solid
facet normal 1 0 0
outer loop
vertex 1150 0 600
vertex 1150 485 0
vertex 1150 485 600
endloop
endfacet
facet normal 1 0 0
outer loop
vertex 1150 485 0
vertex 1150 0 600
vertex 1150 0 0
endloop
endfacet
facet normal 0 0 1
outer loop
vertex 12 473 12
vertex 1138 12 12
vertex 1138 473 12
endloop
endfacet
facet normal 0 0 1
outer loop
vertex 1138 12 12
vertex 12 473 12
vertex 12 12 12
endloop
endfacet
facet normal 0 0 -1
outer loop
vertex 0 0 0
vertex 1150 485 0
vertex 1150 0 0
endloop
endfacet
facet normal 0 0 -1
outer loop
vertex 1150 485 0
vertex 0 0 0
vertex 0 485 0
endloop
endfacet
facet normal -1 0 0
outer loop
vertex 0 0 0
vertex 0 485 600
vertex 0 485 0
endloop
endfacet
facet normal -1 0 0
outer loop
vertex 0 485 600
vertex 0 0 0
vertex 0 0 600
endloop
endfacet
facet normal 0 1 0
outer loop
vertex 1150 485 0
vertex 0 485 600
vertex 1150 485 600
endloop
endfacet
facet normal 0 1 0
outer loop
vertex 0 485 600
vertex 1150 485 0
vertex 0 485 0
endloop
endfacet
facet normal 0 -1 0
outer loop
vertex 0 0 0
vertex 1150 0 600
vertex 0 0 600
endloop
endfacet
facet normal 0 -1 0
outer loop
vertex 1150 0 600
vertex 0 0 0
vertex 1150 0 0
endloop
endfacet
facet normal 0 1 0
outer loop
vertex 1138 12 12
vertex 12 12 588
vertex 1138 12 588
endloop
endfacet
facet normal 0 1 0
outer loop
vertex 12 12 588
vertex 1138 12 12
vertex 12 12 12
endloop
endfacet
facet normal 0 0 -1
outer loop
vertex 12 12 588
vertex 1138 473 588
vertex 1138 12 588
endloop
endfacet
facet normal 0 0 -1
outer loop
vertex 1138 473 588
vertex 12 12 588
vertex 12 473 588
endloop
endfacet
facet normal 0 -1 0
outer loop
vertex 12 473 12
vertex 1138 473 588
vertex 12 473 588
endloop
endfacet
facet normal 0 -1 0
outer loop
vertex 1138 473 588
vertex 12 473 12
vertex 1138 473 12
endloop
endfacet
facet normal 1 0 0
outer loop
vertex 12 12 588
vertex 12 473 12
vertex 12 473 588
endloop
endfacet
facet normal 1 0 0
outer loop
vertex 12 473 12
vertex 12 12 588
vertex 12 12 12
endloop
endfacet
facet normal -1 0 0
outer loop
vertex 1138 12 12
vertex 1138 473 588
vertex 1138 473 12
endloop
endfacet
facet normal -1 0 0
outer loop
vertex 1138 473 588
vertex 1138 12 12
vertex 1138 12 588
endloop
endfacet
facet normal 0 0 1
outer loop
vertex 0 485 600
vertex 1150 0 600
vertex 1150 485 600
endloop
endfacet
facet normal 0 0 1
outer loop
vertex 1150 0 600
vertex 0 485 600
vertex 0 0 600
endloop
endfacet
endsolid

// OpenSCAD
$fn=24;

// all dimensions are outside dimensions
// basic box assumes that top side is open
module basic_box(width, height, depth, thickness=12){
    // bottom plate
    plate(width, depth, thickness);  
    
    // front plate
    translate([0,thickness,thickness]) rotate([90,0,0]) plate(width, height-thickness, thickness);  
    // back plate
    translate([0,depth ,thickness]) rotate([90,0,0]) plate(width, height-thickness, thickness);  
    
    // side plate left
    translate([0,thickness,height]) rotate([0,90,0]) plate(height-thickness, depth-2*thickness, thickness);  
    // side plate right
    translate([width-thickness,thickness,height]) rotate([0,90,0]) plate(height-thickness, depth-2*thickness, thickness);  
   

}

module plate(x,y,z){
    color("LightGrey") cube([x,y,z]);
    echo("Plate: ",x/10,"x",y/10,"cm");

}


// not very elegant, but works
module printed_edge_3sides(size=50, thickness=6){
   difference(){
       cube(size);
       translate([thickness, thickness, thickness]) {
         difference(){
            cube(size);
            rotate(a=45,v=[0,0,1]) translate([-size+10,-size/2,0])   cube(size);
         }
       }
       translate(v=[size/3*2,thickness+0.5,size/3]) rotate([90,0,0]) cylinder(r=3.5/2, h=thickness+1);
       translate(v=[size/3*2,thickness+0.5,size/3*2]) rotate([90,0,0]) cylinder(r=3.5/2, h=thickness+1);
       translate(v=[-0.5,size/3*2,size/3]) rotate([0,90,0]) cylinder(r=3.5/2, h=thickness+1);
       translate(v=[-0.5,size/3*2,size/3*2]) rotate([0,90,0]) cylinder(r=3.5/2, h=thickness+1);
        
       translate([5,5,0]){
       translate(v=[size/3,size/3 ,-0.5]) rotate([0,0,0]) cylinder(r=3.5/2, h=thickness+1);
       translate(v=[size/3*2,size/3*2,-0.5]) rotate([0,0,0]) cylinder(r=3.5/2, h=thickness+1);
       }
   
   }
}

module printed_edge_2sides(size=30, thickness=6){
    difference(){
       cube(size);
       translate([thickness, thickness, 0]) {
       difference(){
            cube(size);
            rotate(a=45,v=[0,0,1]) translate([-size+3,-size/2,0])   cube(size);
         }
       } 
       translate(v=[size/3*2,thickness+0.5,size/3-3]) rotate([90,0,0]) cylinder(r=3.5/2, h=thickness+1);
       translate(v=[size/3*2,thickness+0.5,size/3*2+3]) rotate([90,0,0]) cylinder(r=3.5/2, h=thickness+1);
       translate(v=[-0.5,size/3*2,size/3-3]) rotate([0,90,0]) cylinder(r=3.5/2, h=thickness+1);
       translate(v=[-0.5,size/3*2,size/3*2+3]) rotate([0,90,0]) cylinder(r=3.5/2, h=thickness+1);
    }

}


// custom design: box with lid on top, fits in tight space where sides are inacessable
module top_lid_box(width, height, depth, thickness=12, distance_plate_to_wall_depth=100){
    // note that our rule is that the dimensions we state is what actually comes out
    // we're putting the lid on top of the box, so we make the box by parameter thickness smaller.
    basic_box(width, height-thickness, depth, thickness);
    
    
    translate([0,0,height-thickness]){
       // this one goes to the wall
       plate(width, distance_plate_to_wall_depth, thickness);
       // we're using a bought hindge to the ouside now that doesn't need any spacing
       translate([0,distance_plate_to_wall_depth,0]) plate(width, depth-distance_plate_to_wall_depth, thickness);
    }
    
}



//printed_edge_2sides();
top_lid_box(1150,600,485,12);
